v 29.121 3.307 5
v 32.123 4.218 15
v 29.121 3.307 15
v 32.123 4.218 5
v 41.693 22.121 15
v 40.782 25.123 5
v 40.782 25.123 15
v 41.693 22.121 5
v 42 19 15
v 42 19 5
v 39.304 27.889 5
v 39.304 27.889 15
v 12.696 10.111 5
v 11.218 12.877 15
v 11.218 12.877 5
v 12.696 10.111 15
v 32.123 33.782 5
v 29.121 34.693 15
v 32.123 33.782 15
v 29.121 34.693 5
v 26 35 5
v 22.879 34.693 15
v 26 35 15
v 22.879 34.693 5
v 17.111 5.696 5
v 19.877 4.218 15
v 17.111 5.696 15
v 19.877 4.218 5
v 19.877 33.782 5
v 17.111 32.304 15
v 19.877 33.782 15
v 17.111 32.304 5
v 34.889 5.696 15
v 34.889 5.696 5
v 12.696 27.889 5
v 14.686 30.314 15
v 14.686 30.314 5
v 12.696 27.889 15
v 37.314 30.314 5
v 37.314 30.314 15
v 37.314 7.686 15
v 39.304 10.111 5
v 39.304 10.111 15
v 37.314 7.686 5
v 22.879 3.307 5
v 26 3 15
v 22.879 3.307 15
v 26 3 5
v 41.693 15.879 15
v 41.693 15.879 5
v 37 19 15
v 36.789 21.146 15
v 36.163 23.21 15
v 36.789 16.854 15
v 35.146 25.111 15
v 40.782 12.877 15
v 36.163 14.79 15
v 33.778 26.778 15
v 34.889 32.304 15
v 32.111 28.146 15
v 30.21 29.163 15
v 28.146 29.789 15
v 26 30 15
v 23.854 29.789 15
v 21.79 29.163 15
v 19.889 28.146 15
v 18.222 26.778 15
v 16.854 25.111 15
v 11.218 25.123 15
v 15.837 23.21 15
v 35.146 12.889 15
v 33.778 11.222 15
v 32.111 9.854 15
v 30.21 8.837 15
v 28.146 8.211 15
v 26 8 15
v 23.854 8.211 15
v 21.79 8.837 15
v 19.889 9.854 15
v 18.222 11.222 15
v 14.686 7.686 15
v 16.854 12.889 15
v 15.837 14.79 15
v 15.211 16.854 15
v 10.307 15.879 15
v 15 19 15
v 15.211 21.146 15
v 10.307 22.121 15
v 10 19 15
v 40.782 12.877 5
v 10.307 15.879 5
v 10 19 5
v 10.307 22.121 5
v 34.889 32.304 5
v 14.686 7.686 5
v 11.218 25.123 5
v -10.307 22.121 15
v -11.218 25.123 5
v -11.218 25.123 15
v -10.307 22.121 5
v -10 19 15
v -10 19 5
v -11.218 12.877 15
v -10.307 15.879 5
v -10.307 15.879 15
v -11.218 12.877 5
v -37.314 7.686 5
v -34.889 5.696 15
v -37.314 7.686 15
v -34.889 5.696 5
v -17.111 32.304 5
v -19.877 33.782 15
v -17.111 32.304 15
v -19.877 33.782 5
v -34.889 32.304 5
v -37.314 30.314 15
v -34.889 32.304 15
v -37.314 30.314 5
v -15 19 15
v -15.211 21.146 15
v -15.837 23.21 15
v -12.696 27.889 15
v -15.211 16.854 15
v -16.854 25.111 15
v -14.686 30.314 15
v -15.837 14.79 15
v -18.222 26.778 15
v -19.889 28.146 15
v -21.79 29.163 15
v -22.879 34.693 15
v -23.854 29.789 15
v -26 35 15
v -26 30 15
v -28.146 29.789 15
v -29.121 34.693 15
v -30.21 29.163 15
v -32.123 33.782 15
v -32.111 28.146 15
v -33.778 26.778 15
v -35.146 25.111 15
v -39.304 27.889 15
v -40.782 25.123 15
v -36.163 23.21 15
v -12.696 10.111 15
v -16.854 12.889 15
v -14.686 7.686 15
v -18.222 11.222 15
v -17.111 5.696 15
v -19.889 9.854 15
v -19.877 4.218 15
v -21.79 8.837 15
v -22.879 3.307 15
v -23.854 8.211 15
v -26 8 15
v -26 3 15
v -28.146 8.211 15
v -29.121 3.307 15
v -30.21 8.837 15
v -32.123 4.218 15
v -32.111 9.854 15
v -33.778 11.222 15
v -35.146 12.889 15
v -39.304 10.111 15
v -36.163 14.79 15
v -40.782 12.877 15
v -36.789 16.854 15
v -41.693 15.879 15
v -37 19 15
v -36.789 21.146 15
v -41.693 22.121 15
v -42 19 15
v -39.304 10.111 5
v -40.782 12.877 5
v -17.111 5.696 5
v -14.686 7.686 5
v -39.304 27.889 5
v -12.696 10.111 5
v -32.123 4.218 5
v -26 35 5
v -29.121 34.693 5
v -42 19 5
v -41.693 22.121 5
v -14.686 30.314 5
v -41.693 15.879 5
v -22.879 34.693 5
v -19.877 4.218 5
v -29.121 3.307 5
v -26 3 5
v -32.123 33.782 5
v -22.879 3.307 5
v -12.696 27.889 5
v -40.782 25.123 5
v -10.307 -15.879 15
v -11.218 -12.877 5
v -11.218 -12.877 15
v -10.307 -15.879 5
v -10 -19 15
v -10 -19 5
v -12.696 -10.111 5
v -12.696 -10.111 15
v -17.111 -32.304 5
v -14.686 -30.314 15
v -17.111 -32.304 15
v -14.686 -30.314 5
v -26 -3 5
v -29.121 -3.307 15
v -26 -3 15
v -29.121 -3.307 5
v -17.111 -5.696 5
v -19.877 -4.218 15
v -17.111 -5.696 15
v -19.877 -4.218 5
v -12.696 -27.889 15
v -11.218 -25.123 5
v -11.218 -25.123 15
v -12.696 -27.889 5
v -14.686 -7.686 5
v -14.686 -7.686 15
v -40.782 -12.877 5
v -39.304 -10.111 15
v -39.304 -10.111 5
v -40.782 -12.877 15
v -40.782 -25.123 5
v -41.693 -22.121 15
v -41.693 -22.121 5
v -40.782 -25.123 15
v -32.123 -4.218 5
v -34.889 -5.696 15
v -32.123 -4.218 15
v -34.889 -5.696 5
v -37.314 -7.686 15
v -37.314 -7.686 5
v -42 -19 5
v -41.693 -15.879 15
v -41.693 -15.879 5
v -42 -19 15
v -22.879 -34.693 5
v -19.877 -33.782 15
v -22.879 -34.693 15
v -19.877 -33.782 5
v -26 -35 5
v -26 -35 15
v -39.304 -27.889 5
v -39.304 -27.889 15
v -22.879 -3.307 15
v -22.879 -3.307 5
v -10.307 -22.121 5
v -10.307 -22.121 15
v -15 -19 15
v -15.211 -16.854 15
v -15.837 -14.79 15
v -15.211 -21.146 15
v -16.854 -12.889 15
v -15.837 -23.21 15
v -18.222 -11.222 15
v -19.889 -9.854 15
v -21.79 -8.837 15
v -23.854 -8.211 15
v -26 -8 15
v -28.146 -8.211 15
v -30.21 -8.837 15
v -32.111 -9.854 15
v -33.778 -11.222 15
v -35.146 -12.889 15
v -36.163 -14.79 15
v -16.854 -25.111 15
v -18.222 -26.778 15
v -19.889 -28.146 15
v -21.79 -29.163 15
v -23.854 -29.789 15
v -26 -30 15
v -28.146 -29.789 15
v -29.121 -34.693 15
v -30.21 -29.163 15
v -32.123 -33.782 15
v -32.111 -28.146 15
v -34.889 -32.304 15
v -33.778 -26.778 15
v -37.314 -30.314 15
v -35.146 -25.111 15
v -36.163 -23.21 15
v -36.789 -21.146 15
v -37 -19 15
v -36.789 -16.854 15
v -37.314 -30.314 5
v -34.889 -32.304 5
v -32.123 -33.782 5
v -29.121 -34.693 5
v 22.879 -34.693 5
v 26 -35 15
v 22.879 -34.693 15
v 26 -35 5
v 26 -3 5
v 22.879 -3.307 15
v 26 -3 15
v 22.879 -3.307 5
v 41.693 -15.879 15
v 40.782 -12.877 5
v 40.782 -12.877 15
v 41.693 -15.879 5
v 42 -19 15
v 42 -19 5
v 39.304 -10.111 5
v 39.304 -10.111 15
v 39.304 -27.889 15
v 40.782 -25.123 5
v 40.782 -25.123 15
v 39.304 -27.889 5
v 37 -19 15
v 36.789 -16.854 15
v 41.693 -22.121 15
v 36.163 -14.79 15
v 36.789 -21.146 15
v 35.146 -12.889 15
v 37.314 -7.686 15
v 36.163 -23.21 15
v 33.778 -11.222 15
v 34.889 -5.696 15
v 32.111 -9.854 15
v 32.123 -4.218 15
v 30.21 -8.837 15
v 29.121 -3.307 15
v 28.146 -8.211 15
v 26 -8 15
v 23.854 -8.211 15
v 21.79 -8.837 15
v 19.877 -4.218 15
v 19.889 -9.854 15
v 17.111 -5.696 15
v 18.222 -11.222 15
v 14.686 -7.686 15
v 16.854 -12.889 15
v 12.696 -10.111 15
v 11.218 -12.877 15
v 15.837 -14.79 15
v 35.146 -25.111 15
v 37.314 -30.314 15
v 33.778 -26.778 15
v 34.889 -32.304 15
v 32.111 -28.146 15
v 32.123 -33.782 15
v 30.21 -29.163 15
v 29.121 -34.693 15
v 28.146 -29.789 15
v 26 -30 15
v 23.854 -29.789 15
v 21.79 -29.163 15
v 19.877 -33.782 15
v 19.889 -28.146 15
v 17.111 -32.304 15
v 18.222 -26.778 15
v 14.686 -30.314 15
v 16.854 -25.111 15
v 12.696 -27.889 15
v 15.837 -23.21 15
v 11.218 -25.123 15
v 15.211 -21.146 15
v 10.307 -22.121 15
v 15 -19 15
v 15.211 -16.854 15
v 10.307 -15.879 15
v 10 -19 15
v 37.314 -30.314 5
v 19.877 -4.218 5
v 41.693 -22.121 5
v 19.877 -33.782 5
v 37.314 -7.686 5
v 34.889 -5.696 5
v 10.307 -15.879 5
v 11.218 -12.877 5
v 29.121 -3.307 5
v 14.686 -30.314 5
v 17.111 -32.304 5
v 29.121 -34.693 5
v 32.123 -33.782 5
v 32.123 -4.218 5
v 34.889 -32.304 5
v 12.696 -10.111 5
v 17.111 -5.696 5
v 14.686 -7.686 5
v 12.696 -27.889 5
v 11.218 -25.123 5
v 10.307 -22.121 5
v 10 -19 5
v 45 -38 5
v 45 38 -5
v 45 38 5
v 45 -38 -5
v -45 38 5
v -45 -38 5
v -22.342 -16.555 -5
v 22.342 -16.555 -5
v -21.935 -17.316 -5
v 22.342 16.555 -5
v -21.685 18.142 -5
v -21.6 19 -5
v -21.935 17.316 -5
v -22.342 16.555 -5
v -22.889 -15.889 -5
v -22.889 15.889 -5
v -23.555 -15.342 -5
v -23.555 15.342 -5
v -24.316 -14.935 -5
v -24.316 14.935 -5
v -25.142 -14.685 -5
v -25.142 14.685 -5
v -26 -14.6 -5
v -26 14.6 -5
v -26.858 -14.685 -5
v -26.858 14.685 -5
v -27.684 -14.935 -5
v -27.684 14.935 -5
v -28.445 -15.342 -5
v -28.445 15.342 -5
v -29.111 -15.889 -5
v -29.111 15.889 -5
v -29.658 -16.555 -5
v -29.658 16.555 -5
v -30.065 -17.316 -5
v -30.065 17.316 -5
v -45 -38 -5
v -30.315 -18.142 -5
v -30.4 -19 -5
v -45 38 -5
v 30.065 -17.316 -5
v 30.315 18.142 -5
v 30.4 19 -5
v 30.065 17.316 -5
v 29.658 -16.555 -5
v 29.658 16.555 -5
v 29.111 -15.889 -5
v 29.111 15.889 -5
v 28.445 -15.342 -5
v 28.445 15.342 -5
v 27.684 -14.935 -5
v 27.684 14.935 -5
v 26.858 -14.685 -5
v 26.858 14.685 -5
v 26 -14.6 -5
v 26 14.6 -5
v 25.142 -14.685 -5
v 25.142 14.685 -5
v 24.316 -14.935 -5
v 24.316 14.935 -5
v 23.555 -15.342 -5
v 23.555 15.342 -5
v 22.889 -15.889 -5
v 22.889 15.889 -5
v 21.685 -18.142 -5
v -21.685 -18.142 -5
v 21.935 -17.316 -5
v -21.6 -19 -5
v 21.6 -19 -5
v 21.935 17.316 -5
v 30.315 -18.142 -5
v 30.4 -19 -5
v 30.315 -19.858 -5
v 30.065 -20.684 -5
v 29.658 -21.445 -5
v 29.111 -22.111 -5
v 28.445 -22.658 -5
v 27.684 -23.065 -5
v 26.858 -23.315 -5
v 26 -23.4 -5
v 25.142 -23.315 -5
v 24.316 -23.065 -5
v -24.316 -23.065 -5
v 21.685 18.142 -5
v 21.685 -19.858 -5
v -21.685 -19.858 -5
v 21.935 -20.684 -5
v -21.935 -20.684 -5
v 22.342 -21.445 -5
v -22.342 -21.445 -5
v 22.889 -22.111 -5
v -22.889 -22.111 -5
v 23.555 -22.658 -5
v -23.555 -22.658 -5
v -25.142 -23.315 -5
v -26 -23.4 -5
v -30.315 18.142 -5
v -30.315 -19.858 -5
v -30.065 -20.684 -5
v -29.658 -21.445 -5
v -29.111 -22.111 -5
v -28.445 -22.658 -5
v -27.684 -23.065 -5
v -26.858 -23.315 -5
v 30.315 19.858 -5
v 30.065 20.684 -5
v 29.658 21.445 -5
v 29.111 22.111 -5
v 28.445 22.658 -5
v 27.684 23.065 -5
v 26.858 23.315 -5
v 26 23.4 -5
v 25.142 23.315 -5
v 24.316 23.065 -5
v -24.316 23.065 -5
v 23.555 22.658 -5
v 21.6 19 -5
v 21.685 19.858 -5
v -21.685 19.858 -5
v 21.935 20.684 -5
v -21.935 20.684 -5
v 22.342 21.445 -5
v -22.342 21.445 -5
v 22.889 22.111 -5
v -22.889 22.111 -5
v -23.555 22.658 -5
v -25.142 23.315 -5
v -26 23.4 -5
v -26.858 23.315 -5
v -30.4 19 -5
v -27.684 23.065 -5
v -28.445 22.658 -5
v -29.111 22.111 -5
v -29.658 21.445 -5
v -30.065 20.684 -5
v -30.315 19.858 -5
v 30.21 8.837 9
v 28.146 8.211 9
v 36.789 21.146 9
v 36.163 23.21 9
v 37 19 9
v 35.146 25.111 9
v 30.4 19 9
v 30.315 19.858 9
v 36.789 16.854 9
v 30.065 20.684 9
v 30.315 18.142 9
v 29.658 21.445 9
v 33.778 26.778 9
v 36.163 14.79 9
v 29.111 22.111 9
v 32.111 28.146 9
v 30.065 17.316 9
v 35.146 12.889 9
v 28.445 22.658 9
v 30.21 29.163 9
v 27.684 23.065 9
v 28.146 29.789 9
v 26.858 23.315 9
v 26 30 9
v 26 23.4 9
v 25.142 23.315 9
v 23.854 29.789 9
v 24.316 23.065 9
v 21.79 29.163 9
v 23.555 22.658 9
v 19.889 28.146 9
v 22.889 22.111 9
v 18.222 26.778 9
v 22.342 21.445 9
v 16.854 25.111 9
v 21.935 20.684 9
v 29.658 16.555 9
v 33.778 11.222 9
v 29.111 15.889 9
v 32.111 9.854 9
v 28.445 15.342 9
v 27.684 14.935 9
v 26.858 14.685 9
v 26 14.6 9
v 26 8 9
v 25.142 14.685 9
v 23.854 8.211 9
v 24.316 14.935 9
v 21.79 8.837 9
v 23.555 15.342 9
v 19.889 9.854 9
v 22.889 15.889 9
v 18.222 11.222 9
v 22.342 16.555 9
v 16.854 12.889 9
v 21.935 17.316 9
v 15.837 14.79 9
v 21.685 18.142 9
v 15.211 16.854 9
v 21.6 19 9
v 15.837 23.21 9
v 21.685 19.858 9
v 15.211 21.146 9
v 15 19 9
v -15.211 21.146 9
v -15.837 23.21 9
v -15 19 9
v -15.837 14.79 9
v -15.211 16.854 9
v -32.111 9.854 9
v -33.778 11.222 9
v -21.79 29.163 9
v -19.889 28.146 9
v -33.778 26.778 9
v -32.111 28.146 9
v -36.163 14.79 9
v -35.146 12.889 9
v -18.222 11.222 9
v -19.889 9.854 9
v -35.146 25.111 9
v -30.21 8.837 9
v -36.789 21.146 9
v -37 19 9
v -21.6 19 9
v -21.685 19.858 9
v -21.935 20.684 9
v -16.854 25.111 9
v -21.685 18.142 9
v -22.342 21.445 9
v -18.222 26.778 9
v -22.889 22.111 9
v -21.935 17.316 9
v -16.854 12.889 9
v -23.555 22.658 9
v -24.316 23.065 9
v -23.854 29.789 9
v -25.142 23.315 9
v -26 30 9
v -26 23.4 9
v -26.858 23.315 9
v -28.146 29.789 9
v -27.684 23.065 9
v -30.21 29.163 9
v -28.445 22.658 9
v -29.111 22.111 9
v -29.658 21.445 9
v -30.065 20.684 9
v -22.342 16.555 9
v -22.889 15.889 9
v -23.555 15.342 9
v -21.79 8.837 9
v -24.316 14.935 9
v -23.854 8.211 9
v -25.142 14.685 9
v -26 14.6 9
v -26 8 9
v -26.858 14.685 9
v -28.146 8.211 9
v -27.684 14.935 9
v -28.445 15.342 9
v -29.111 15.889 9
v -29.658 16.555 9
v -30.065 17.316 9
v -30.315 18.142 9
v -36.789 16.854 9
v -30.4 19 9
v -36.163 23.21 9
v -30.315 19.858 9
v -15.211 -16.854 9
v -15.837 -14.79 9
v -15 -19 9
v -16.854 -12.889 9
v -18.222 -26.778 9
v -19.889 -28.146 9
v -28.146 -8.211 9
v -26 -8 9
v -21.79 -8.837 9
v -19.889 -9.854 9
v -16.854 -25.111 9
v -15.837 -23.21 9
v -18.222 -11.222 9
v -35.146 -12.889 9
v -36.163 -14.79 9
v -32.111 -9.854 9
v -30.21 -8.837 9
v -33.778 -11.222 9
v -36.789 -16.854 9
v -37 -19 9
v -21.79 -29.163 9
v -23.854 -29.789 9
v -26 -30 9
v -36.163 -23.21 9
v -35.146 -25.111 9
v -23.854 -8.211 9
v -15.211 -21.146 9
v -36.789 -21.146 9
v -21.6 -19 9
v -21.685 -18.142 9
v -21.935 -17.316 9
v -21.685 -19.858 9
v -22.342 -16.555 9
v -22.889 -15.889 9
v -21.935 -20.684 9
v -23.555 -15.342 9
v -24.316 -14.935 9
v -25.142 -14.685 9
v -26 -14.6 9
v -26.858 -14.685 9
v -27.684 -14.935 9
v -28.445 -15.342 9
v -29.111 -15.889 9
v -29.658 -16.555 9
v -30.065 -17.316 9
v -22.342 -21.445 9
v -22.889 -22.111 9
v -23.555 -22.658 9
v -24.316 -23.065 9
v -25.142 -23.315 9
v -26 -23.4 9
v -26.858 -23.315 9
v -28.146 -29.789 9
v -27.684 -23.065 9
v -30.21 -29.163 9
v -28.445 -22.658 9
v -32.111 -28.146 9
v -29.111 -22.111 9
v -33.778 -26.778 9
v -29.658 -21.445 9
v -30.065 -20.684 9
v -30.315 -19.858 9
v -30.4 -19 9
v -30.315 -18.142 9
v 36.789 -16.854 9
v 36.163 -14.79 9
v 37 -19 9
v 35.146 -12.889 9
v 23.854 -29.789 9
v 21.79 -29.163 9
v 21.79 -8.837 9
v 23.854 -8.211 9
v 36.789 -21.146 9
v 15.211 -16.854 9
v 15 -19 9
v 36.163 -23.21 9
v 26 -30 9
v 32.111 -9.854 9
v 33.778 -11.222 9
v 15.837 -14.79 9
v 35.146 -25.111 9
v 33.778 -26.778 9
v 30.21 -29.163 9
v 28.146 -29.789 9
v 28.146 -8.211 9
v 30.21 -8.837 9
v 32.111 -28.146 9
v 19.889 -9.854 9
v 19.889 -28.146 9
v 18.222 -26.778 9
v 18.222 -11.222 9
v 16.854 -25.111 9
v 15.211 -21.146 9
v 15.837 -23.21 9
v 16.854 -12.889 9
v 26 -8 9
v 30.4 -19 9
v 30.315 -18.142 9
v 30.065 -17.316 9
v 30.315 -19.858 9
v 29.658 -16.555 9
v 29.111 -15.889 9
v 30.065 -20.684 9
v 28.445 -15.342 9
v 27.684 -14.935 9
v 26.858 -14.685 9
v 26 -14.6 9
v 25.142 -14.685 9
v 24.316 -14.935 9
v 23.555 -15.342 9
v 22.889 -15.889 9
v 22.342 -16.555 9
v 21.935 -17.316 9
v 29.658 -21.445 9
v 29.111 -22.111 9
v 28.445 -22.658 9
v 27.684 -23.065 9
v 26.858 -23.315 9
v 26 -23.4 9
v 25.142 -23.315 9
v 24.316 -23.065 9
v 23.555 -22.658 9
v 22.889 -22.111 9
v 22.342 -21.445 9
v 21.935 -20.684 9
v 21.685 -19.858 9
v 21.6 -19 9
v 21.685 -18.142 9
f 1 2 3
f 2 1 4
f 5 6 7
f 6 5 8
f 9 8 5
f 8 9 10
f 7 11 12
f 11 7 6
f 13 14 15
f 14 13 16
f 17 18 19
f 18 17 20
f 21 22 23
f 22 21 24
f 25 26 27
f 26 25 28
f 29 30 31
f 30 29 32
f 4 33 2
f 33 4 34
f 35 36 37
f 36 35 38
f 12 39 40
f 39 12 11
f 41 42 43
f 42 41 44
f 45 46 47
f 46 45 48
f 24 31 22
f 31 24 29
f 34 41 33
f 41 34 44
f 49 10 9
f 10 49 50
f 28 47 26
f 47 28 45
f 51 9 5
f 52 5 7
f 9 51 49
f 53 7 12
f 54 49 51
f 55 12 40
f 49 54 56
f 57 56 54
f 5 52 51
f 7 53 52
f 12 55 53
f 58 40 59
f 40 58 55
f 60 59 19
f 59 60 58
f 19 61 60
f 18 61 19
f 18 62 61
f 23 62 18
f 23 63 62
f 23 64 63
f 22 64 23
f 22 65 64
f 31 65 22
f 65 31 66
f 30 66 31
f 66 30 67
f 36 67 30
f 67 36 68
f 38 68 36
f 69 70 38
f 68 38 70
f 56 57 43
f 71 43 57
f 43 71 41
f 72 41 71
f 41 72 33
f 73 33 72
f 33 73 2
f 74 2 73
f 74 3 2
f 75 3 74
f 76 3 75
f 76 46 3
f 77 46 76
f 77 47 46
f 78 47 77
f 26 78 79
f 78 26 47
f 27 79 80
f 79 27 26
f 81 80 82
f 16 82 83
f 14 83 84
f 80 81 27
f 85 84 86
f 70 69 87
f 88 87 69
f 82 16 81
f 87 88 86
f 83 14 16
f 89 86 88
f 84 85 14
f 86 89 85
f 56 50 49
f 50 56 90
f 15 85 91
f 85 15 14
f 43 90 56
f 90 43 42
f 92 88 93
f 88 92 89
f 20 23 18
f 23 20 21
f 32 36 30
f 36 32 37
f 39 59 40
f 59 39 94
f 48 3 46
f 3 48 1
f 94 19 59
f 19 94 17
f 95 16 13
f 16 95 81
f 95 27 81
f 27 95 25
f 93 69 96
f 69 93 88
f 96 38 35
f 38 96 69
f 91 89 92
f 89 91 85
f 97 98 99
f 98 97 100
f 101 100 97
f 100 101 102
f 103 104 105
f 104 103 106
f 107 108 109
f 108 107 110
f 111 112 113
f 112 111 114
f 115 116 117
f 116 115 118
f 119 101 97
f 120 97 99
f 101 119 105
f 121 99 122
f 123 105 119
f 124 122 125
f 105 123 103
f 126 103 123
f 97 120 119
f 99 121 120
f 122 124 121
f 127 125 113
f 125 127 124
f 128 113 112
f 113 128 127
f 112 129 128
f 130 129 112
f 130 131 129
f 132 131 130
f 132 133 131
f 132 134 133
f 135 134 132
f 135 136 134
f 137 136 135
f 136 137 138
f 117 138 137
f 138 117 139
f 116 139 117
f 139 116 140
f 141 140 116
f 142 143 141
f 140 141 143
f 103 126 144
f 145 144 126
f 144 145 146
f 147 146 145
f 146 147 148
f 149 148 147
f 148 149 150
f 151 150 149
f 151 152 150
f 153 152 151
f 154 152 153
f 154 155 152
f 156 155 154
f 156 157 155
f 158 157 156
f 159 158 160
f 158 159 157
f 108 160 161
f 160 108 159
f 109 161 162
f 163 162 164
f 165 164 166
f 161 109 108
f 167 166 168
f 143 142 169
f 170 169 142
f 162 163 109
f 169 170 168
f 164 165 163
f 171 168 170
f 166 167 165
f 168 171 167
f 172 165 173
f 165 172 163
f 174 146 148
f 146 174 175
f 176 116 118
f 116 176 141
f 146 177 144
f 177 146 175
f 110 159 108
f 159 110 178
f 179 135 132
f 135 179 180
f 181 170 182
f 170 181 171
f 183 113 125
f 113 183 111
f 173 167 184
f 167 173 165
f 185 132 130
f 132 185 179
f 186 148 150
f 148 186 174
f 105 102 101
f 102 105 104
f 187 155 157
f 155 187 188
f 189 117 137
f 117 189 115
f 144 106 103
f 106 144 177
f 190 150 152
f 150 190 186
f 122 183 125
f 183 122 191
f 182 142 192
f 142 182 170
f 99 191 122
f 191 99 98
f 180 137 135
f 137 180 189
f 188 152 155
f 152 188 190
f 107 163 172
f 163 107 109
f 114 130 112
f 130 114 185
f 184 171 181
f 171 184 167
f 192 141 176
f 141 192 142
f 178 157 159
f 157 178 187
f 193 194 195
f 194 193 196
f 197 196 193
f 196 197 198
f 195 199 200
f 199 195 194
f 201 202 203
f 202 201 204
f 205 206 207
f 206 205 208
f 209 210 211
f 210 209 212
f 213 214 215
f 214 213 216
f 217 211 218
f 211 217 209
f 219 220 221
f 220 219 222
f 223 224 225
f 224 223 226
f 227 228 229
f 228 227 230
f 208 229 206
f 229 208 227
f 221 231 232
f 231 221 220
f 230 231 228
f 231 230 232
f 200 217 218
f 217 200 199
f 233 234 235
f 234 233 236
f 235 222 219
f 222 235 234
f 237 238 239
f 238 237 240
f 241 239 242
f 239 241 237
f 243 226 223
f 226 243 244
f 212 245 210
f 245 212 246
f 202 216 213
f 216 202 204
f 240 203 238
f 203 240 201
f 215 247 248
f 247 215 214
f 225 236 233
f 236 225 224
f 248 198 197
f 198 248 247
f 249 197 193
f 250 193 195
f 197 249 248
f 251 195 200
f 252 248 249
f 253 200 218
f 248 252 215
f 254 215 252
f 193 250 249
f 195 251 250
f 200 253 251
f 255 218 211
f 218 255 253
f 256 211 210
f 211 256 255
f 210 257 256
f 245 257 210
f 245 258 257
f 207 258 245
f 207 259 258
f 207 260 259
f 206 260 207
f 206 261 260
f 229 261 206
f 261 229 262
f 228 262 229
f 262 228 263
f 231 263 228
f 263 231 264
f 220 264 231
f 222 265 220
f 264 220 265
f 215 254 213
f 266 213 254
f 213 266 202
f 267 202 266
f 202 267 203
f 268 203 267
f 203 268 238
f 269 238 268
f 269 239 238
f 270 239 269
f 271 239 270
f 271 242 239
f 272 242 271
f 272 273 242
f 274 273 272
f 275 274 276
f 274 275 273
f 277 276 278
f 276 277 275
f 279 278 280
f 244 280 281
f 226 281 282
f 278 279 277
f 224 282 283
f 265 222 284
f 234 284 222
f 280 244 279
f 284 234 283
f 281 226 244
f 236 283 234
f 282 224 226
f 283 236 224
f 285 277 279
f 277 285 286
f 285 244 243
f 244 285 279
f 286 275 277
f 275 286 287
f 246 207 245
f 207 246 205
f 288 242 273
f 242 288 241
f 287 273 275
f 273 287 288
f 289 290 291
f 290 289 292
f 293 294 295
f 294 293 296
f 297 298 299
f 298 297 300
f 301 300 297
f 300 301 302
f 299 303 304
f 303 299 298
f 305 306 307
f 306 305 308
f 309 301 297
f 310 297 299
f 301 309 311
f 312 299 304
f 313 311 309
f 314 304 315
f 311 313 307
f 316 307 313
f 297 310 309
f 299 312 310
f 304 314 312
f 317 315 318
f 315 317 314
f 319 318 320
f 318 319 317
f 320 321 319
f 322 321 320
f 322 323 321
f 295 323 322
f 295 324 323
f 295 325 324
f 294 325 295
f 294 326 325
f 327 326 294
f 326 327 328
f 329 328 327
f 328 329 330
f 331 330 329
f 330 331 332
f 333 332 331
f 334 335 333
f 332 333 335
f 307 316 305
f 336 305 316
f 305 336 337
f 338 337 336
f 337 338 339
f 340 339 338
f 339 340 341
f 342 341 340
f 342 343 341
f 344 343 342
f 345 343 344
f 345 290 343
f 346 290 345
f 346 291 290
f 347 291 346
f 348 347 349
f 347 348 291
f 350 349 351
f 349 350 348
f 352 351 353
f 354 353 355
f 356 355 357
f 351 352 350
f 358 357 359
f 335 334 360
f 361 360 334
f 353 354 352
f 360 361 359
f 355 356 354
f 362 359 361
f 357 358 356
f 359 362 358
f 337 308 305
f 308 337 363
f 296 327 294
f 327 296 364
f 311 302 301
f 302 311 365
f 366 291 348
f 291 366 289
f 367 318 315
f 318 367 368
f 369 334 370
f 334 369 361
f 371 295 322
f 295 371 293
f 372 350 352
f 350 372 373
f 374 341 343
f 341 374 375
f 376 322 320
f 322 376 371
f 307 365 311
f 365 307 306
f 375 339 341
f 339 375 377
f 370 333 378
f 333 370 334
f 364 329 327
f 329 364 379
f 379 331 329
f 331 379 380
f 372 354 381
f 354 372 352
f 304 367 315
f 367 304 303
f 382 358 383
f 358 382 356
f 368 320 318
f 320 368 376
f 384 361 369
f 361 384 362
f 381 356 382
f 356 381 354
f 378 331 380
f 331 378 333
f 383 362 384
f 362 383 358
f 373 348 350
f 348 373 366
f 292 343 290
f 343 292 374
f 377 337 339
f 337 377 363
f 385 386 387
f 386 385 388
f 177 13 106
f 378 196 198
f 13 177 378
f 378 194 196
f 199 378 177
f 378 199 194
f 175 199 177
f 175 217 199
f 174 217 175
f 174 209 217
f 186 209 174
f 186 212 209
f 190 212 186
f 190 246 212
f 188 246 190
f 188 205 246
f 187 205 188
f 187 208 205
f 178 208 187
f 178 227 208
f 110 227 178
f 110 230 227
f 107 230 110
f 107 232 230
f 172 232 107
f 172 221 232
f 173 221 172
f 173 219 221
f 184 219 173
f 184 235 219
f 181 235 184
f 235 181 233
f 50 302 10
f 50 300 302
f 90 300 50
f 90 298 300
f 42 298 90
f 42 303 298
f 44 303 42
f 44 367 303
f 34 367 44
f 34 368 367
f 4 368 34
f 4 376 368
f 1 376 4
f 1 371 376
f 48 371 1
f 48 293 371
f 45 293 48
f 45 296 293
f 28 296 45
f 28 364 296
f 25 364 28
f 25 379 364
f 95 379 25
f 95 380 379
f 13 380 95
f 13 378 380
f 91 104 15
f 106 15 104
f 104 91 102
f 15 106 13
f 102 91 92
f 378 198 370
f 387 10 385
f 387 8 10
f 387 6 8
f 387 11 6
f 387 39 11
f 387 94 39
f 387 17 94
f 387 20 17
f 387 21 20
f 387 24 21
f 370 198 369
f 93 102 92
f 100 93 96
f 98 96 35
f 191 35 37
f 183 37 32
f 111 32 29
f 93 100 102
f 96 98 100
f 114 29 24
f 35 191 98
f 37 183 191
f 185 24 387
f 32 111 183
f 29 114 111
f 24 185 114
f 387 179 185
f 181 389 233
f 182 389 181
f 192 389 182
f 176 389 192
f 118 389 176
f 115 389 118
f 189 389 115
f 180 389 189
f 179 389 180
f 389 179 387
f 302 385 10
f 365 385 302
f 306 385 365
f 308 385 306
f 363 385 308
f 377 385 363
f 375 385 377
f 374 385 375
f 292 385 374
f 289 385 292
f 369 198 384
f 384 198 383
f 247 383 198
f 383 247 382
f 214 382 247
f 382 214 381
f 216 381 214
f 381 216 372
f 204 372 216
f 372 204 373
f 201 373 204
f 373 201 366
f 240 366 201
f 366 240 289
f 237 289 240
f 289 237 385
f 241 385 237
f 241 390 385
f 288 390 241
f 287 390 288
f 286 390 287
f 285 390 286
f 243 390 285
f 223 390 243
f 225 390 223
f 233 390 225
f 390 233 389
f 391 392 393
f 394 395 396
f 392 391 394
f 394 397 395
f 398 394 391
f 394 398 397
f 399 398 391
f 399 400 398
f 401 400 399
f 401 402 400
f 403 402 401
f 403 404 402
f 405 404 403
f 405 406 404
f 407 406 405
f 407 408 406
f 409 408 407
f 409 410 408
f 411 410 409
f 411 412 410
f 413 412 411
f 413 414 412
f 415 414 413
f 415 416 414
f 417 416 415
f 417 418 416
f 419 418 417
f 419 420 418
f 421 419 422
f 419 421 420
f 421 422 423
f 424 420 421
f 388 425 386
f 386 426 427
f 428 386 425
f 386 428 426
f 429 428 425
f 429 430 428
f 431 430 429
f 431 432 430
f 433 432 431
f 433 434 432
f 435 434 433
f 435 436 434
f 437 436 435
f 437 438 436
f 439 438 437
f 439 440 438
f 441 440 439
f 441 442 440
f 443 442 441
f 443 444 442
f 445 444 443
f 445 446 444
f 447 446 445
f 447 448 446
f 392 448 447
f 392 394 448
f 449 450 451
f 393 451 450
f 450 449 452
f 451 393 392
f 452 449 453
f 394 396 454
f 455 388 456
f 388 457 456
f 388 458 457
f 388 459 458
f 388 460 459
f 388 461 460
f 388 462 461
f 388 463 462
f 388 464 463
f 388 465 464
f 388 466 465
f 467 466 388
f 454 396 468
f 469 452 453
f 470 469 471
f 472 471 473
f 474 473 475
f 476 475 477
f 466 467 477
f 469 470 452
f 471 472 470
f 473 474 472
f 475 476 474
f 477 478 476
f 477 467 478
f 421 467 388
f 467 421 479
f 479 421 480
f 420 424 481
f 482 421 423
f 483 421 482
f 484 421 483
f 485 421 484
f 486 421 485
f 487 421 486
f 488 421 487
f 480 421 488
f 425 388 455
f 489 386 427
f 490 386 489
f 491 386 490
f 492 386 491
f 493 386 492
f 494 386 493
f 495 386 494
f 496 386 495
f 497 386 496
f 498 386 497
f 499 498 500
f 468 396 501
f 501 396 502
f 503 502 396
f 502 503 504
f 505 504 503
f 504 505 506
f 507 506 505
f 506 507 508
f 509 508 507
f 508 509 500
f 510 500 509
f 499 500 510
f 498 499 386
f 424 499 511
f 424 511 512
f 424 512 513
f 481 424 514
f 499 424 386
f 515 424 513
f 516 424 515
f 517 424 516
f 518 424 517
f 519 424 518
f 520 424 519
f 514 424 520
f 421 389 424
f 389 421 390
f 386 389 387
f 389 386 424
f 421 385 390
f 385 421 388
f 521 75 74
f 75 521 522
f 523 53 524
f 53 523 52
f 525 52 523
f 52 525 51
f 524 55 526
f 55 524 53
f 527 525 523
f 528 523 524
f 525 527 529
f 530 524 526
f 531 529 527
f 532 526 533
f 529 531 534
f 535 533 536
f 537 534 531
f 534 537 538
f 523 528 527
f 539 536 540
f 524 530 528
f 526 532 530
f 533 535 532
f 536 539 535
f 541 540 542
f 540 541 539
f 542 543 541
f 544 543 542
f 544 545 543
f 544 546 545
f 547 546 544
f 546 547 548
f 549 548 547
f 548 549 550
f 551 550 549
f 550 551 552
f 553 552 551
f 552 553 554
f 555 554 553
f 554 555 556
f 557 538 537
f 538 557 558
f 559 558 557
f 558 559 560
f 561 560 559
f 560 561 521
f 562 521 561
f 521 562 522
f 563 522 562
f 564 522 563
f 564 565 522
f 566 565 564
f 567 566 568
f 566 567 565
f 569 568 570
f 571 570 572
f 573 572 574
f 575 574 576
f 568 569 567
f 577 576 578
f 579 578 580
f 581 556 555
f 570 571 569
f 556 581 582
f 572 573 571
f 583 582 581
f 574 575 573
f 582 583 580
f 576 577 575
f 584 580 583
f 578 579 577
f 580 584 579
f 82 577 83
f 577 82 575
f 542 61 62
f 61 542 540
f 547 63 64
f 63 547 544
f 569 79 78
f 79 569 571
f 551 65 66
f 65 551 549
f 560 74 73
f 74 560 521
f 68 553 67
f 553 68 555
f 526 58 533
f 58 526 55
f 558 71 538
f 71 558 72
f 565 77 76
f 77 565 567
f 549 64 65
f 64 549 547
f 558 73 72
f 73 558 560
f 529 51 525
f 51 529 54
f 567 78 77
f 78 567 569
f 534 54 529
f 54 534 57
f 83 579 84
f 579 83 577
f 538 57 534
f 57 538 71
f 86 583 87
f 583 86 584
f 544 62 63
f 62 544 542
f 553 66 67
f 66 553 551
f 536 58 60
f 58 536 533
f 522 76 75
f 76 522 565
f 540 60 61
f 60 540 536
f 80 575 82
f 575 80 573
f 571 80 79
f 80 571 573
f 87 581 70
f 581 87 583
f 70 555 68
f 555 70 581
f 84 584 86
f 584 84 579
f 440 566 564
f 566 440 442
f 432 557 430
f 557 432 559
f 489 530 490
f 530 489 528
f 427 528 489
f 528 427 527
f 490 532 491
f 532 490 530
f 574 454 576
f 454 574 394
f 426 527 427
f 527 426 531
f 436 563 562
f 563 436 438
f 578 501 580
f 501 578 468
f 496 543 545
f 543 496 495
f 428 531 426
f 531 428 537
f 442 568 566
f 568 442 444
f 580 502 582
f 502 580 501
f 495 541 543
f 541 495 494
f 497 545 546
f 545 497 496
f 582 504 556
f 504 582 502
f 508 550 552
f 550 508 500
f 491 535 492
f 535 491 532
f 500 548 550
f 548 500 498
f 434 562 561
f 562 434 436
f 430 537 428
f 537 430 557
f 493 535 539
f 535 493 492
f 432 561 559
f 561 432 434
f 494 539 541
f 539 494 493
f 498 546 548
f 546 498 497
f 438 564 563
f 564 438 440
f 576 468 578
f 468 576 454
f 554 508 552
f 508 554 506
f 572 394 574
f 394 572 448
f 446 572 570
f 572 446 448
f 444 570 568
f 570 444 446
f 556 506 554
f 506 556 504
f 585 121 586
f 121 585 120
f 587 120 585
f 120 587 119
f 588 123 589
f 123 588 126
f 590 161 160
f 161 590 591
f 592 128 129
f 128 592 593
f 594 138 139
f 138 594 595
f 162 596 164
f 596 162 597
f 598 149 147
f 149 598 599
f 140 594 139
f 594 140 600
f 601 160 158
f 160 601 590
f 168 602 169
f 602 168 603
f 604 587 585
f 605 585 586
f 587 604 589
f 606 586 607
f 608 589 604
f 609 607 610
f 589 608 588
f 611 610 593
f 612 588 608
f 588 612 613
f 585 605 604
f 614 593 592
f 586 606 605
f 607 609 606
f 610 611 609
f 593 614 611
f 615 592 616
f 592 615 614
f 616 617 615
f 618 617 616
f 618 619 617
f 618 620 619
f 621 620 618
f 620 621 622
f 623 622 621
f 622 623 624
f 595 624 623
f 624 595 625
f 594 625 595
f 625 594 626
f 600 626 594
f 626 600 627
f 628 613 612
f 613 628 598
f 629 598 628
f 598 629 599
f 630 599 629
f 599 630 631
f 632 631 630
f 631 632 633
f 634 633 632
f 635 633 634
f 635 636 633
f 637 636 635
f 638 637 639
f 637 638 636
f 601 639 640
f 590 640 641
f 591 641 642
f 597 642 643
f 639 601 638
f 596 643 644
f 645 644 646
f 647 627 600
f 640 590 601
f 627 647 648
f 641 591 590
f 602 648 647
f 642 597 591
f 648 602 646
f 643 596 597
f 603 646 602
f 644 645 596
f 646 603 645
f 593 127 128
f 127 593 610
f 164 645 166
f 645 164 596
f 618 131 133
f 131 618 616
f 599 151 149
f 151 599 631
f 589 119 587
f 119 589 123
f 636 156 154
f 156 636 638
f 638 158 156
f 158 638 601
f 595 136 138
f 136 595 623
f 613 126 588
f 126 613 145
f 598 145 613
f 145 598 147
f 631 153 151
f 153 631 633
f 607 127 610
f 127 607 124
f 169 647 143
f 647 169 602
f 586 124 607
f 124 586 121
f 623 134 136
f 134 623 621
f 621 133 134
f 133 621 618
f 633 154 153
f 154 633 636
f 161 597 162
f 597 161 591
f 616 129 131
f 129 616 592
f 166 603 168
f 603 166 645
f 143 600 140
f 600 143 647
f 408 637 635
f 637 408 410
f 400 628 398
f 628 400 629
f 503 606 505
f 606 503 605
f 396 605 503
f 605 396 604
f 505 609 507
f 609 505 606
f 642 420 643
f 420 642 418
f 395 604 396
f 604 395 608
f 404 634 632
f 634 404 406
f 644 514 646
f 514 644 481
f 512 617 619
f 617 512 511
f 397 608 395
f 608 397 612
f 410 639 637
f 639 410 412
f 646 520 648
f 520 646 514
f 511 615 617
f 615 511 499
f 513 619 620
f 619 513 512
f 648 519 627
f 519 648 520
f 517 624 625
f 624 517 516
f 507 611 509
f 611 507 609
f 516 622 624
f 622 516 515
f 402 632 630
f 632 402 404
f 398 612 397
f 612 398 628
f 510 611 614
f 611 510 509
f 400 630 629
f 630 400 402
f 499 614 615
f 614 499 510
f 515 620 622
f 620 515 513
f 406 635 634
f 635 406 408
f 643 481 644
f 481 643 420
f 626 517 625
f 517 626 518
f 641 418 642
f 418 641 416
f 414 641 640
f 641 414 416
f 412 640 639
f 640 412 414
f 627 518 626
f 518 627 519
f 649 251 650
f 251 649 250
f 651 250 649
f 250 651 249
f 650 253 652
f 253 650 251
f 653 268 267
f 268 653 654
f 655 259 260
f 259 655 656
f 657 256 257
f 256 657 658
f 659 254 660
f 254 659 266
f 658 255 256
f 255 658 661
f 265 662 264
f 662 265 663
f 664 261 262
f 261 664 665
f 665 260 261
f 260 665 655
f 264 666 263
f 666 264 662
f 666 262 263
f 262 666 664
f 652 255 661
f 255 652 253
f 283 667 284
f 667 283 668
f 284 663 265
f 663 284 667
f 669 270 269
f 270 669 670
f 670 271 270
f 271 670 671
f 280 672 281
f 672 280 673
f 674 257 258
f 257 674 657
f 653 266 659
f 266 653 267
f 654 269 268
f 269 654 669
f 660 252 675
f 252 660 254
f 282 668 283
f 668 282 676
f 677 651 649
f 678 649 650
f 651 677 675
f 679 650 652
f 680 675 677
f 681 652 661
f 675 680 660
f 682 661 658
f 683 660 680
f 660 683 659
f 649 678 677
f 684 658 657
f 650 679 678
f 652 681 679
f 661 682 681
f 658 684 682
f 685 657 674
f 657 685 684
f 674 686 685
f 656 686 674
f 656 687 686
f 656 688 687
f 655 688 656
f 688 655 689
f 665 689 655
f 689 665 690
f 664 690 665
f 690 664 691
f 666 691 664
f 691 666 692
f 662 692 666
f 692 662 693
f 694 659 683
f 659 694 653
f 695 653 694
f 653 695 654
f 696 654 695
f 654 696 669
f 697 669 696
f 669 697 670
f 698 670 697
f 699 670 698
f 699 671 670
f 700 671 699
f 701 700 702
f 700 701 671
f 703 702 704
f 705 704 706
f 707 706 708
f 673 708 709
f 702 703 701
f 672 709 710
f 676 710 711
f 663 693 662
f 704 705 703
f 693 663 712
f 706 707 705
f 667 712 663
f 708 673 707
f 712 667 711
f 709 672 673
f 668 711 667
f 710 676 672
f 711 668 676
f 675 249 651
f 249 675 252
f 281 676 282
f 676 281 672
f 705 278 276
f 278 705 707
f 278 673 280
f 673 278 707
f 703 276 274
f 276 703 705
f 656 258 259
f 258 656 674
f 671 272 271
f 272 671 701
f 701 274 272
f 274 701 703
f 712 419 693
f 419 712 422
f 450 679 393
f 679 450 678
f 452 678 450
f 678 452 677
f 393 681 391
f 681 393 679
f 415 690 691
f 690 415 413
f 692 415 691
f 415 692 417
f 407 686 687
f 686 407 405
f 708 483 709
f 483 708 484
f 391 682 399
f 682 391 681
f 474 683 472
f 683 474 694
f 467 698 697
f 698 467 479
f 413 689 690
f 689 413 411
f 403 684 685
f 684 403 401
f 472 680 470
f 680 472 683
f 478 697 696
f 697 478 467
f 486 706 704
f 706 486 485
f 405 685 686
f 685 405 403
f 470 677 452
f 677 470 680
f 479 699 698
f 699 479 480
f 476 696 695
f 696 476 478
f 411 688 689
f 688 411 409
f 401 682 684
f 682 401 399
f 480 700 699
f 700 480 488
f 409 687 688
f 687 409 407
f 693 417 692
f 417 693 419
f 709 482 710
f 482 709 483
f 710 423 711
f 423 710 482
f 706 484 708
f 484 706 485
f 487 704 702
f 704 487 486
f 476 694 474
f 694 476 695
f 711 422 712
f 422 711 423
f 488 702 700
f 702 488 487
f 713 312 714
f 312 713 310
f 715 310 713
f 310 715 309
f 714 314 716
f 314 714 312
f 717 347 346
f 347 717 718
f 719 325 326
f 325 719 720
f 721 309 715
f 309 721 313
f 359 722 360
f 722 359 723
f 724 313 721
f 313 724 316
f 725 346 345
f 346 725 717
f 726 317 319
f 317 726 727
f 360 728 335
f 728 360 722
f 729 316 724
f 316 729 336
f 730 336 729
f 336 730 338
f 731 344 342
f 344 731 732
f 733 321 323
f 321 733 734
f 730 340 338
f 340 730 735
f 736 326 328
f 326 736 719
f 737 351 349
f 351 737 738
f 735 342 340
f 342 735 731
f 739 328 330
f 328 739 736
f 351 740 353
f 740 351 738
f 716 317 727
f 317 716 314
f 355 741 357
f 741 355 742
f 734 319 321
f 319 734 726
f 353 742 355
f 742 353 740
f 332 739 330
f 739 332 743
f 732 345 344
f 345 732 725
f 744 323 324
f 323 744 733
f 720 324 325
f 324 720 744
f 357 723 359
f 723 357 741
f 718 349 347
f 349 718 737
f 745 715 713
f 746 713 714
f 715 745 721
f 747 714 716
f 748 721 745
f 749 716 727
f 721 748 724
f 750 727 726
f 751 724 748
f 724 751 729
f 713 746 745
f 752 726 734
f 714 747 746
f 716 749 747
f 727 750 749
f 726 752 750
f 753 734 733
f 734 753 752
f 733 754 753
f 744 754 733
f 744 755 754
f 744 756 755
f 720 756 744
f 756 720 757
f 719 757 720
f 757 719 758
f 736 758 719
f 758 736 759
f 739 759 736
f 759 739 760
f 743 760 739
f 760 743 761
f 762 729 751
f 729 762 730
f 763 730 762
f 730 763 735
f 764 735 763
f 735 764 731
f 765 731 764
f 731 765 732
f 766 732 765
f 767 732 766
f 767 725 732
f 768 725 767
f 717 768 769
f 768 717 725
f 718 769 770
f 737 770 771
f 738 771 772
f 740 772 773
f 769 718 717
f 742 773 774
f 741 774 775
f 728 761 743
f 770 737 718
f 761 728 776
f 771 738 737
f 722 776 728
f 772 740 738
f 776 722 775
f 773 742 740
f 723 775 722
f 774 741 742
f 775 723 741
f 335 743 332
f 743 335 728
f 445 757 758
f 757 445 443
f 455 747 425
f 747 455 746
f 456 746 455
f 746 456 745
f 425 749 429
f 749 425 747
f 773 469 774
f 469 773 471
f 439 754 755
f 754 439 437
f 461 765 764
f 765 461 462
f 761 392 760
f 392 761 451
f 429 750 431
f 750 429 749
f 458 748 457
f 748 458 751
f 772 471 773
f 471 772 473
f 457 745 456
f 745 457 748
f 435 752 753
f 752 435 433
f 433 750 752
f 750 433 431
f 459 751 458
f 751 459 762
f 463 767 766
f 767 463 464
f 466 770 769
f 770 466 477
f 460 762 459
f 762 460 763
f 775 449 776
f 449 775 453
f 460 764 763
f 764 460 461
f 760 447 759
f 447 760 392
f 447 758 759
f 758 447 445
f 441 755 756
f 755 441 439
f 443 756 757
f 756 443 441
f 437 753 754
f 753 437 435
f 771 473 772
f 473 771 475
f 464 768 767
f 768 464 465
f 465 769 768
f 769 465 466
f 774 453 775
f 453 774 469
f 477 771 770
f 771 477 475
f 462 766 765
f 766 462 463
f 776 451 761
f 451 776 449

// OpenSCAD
$fn = 32;

// ----------------------------------------------------------------------
// Socket pad plate
// bosses with counterbored sockets for the screws
// ----------------------------------------------------------------------

// --- parameters (mm) ---
base_t = 10;           // base plate thickness
boss_h = 10;           // boss height above the base plate
boss_d = 32;           // boss diameter
socket_d = 22;         // socket diameter
socket_depth = 6;      // socket depth from the boss face
bolt_d = 8.8;          // screw clearance hole through the socket floor
plate = [90, 76, 10];  // overall size (x, y, z)
edge = 19;             // boss centre offset from the plate edge
pads = 4;              // boss count, one per corner

// --- derived feature positions (mm) ---
height = base_t + boss_h;        // = 20   overall height of the part
corner_x = plate[0] / 2 - edge;  // = 26   boss centre X
corner_y = plate[1] / 2 - edge;  // = 19   boss centre Y
feature_centers = [
  [corner_x, corner_y],
  [-corner_x, corner_y],
  [-corner_x, -corner_y],
  [corner_x, -corner_y]
];   // boss centres: sockets, holes and the pads themselves are placed from here

// base plate, bosses on feature_centers, socket + through hole in each
difference() {
  union() {
    cube(plate, center = true);
    for (centre = feature_centers)
      translate([centre[0], centre[1], plate[2] / 2 - 1])
        cylinder(d = boss_d, h = boss_h + 1);
  }
  for (centre = feature_centers) {
    translate([centre[0], centre[1], plate[2] / 2 + boss_h - socket_depth])
      cylinder(d = socket_d, h = socket_depth + 1);
    translate([centre[0], centre[1], -height])
      cylinder(d = bolt_d, h = 2 * height + 2);  // through the socket floor
  }
}
